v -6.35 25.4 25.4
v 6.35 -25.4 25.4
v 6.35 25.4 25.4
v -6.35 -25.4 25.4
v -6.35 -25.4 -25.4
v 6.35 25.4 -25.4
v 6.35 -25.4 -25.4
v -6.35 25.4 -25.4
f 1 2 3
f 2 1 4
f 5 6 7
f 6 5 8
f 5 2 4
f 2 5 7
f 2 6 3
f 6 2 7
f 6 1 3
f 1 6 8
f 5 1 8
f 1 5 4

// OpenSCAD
// ========================================
// a 0.5 by 2 by 2 inch box
// NeuroCAD canonical IR; dimensions are millimetres
// ========================================
$fn = 48;

cube(size=[12.7, 50.8, 50.8], center=true);
